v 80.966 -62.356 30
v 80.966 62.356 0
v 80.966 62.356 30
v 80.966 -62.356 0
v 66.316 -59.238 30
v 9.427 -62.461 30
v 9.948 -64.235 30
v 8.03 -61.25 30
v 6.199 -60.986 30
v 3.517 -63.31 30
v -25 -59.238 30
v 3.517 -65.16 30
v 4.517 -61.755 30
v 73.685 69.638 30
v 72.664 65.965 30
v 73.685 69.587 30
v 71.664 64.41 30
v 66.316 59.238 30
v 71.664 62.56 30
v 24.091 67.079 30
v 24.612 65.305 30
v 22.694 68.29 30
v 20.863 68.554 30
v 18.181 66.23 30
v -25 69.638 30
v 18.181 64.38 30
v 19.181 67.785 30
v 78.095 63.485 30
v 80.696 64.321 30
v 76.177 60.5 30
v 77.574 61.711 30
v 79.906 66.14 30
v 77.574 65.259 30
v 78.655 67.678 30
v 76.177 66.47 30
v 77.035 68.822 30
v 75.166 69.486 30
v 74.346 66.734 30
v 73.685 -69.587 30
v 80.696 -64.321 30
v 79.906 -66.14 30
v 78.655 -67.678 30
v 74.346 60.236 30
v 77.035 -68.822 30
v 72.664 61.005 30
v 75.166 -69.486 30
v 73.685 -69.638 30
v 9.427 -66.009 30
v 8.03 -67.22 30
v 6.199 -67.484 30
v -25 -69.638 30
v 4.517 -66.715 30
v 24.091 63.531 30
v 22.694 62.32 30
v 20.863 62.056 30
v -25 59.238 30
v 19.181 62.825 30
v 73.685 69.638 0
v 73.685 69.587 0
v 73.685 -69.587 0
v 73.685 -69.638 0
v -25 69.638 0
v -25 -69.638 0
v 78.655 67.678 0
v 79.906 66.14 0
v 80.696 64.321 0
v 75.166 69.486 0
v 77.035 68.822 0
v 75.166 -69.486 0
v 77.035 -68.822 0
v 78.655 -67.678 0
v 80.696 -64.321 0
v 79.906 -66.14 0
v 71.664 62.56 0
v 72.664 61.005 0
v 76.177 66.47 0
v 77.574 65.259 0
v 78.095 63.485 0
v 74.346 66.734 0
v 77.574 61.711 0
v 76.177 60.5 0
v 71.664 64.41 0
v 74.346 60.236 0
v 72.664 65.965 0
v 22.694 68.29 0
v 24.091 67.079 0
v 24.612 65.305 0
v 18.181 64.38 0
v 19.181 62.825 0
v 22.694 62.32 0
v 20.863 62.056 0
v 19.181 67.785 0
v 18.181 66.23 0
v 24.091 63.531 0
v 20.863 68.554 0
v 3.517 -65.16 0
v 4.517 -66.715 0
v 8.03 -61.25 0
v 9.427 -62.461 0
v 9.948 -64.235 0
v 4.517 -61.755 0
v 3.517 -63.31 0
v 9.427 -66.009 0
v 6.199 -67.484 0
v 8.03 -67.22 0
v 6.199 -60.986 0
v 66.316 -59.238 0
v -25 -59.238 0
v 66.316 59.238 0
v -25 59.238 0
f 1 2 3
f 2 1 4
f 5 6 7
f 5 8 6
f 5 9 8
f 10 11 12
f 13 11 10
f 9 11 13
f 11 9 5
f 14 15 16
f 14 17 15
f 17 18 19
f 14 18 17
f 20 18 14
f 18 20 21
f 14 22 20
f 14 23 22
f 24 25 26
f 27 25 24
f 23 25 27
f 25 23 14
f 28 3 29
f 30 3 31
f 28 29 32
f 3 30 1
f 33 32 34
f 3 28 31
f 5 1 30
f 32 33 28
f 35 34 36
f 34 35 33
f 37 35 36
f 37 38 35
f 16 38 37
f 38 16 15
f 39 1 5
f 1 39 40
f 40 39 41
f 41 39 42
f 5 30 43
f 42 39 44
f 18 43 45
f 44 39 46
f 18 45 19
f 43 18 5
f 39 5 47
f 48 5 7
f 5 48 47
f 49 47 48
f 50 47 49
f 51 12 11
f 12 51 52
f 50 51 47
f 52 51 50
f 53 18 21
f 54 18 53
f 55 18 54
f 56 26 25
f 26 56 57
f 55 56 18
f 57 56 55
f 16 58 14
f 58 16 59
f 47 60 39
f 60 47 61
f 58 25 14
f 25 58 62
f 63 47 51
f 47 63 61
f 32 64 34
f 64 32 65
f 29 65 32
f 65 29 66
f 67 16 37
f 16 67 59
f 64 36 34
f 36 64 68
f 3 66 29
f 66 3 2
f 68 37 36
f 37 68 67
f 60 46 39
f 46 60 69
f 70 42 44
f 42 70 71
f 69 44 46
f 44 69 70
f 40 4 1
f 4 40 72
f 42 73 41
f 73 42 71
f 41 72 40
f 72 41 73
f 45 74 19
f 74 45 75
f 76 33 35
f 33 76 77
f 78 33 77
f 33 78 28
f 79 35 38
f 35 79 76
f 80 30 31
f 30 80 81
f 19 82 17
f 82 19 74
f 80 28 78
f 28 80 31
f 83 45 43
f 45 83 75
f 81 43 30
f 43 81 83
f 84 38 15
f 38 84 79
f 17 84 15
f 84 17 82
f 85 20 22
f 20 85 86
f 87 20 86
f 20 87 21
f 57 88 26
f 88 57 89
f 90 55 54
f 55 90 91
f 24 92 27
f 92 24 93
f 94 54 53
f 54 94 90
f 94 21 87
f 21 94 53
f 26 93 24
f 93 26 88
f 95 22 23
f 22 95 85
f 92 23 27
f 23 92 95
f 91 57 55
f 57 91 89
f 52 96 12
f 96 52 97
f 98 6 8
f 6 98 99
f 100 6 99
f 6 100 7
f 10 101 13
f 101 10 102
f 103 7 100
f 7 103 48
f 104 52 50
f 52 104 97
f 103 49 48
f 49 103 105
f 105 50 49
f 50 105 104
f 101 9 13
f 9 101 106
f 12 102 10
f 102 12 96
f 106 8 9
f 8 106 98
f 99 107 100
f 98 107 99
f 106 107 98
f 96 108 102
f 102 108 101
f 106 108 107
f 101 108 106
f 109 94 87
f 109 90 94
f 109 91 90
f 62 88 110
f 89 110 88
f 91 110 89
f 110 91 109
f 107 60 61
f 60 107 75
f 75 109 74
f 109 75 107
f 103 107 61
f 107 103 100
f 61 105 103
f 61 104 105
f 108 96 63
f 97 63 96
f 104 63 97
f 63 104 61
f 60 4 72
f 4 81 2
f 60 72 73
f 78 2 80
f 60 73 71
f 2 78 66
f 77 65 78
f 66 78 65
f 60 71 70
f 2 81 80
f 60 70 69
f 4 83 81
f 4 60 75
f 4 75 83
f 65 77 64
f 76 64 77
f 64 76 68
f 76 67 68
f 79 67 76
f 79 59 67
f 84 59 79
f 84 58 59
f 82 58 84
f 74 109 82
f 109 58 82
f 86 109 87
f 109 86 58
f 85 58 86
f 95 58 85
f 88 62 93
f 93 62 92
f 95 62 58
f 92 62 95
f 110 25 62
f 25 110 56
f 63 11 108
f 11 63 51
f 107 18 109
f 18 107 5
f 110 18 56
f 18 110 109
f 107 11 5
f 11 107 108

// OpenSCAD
union () {
  difference () {
    rotate (a=0.0, v=[0,0,0]) {
      union () {
        difference () {
          translate ([0,0,15]) {
            union () {
              cube([161.933, 124.712, 30], center=true);
              cube([147.369, 139.276, 30], center=true);
              translate ([73.6845,62.356,0]) {
                cylinder (h=30, r=7.282, center=true);
              }
              translate ([-73.6845,62.356,0]) {
                cylinder (h=30, r=7.282, center=true);
              }
              translate ([-73.6845,-62.356,0]) {
                cylinder (h=30, r=7.282, center=true);
              }
              translate ([73.6845,-62.356,0]) {
                cylinder (h=30, r=7.282, center=true);
              }
            }
          }
          translate ([74.8135,63.485,0]) {
            cylinder (h=150, r=3.282, center=true);
          }
          translate ([21.330500000000008,65.30499999999999,0]) {
            cylinder (h=150, r=3.282, center=true);
          }
          translate ([6.666499999999999,-64.235,0]) {
            cylinder (h=150, r=3.282, center=true);
          }
        }
        translate ([0,0,-30]) {
          difference () {
            translate ([0,0,15]) {
              union () {
                cube([161.933, 124.712, 30], center=true);
                cube([147.369, 139.276, 30], center=true);
                translate ([73.6845,62.356,0]) {
                  cylinder (h=30, r=7.282, center=true);
                }
                translate ([-73.6845,62.356,0]) {
                  cylinder (h=30, r=7.282, center=true);
                }
                translate ([-73.6845,-62.356,0]) {
                  cylinder (h=30, r=7.282, center=true);
                }
                translate ([73.6845,-62.356,0]) {
                  cylinder (h=30, r=7.282, center=true);
                }
              }
            }
            translate ([74.8135,63.485,0]) {
              cylinder (h=150, r=3.282, center=true);
            }
            translate ([21.330500000000008,65.30499999999999,0]) {
              cylinder (h=150, r=3.282, center=true);
            }
            translate ([6.666499999999999,-64.235,0]) {
              cylinder (h=150, r=3.282, center=true);
            }
          }
        }
      }
    }
    translate ([0,0,-250]) {
      cube([700, 700, 500], center=true);
    }
    translate ([-375,0,0]) {
      cube([700, 700, 500], center=true);
    }
    translate ([0,0,100]) {
      cube([132.6321, 118.4764, 300], center=true);
    }
  }
}
